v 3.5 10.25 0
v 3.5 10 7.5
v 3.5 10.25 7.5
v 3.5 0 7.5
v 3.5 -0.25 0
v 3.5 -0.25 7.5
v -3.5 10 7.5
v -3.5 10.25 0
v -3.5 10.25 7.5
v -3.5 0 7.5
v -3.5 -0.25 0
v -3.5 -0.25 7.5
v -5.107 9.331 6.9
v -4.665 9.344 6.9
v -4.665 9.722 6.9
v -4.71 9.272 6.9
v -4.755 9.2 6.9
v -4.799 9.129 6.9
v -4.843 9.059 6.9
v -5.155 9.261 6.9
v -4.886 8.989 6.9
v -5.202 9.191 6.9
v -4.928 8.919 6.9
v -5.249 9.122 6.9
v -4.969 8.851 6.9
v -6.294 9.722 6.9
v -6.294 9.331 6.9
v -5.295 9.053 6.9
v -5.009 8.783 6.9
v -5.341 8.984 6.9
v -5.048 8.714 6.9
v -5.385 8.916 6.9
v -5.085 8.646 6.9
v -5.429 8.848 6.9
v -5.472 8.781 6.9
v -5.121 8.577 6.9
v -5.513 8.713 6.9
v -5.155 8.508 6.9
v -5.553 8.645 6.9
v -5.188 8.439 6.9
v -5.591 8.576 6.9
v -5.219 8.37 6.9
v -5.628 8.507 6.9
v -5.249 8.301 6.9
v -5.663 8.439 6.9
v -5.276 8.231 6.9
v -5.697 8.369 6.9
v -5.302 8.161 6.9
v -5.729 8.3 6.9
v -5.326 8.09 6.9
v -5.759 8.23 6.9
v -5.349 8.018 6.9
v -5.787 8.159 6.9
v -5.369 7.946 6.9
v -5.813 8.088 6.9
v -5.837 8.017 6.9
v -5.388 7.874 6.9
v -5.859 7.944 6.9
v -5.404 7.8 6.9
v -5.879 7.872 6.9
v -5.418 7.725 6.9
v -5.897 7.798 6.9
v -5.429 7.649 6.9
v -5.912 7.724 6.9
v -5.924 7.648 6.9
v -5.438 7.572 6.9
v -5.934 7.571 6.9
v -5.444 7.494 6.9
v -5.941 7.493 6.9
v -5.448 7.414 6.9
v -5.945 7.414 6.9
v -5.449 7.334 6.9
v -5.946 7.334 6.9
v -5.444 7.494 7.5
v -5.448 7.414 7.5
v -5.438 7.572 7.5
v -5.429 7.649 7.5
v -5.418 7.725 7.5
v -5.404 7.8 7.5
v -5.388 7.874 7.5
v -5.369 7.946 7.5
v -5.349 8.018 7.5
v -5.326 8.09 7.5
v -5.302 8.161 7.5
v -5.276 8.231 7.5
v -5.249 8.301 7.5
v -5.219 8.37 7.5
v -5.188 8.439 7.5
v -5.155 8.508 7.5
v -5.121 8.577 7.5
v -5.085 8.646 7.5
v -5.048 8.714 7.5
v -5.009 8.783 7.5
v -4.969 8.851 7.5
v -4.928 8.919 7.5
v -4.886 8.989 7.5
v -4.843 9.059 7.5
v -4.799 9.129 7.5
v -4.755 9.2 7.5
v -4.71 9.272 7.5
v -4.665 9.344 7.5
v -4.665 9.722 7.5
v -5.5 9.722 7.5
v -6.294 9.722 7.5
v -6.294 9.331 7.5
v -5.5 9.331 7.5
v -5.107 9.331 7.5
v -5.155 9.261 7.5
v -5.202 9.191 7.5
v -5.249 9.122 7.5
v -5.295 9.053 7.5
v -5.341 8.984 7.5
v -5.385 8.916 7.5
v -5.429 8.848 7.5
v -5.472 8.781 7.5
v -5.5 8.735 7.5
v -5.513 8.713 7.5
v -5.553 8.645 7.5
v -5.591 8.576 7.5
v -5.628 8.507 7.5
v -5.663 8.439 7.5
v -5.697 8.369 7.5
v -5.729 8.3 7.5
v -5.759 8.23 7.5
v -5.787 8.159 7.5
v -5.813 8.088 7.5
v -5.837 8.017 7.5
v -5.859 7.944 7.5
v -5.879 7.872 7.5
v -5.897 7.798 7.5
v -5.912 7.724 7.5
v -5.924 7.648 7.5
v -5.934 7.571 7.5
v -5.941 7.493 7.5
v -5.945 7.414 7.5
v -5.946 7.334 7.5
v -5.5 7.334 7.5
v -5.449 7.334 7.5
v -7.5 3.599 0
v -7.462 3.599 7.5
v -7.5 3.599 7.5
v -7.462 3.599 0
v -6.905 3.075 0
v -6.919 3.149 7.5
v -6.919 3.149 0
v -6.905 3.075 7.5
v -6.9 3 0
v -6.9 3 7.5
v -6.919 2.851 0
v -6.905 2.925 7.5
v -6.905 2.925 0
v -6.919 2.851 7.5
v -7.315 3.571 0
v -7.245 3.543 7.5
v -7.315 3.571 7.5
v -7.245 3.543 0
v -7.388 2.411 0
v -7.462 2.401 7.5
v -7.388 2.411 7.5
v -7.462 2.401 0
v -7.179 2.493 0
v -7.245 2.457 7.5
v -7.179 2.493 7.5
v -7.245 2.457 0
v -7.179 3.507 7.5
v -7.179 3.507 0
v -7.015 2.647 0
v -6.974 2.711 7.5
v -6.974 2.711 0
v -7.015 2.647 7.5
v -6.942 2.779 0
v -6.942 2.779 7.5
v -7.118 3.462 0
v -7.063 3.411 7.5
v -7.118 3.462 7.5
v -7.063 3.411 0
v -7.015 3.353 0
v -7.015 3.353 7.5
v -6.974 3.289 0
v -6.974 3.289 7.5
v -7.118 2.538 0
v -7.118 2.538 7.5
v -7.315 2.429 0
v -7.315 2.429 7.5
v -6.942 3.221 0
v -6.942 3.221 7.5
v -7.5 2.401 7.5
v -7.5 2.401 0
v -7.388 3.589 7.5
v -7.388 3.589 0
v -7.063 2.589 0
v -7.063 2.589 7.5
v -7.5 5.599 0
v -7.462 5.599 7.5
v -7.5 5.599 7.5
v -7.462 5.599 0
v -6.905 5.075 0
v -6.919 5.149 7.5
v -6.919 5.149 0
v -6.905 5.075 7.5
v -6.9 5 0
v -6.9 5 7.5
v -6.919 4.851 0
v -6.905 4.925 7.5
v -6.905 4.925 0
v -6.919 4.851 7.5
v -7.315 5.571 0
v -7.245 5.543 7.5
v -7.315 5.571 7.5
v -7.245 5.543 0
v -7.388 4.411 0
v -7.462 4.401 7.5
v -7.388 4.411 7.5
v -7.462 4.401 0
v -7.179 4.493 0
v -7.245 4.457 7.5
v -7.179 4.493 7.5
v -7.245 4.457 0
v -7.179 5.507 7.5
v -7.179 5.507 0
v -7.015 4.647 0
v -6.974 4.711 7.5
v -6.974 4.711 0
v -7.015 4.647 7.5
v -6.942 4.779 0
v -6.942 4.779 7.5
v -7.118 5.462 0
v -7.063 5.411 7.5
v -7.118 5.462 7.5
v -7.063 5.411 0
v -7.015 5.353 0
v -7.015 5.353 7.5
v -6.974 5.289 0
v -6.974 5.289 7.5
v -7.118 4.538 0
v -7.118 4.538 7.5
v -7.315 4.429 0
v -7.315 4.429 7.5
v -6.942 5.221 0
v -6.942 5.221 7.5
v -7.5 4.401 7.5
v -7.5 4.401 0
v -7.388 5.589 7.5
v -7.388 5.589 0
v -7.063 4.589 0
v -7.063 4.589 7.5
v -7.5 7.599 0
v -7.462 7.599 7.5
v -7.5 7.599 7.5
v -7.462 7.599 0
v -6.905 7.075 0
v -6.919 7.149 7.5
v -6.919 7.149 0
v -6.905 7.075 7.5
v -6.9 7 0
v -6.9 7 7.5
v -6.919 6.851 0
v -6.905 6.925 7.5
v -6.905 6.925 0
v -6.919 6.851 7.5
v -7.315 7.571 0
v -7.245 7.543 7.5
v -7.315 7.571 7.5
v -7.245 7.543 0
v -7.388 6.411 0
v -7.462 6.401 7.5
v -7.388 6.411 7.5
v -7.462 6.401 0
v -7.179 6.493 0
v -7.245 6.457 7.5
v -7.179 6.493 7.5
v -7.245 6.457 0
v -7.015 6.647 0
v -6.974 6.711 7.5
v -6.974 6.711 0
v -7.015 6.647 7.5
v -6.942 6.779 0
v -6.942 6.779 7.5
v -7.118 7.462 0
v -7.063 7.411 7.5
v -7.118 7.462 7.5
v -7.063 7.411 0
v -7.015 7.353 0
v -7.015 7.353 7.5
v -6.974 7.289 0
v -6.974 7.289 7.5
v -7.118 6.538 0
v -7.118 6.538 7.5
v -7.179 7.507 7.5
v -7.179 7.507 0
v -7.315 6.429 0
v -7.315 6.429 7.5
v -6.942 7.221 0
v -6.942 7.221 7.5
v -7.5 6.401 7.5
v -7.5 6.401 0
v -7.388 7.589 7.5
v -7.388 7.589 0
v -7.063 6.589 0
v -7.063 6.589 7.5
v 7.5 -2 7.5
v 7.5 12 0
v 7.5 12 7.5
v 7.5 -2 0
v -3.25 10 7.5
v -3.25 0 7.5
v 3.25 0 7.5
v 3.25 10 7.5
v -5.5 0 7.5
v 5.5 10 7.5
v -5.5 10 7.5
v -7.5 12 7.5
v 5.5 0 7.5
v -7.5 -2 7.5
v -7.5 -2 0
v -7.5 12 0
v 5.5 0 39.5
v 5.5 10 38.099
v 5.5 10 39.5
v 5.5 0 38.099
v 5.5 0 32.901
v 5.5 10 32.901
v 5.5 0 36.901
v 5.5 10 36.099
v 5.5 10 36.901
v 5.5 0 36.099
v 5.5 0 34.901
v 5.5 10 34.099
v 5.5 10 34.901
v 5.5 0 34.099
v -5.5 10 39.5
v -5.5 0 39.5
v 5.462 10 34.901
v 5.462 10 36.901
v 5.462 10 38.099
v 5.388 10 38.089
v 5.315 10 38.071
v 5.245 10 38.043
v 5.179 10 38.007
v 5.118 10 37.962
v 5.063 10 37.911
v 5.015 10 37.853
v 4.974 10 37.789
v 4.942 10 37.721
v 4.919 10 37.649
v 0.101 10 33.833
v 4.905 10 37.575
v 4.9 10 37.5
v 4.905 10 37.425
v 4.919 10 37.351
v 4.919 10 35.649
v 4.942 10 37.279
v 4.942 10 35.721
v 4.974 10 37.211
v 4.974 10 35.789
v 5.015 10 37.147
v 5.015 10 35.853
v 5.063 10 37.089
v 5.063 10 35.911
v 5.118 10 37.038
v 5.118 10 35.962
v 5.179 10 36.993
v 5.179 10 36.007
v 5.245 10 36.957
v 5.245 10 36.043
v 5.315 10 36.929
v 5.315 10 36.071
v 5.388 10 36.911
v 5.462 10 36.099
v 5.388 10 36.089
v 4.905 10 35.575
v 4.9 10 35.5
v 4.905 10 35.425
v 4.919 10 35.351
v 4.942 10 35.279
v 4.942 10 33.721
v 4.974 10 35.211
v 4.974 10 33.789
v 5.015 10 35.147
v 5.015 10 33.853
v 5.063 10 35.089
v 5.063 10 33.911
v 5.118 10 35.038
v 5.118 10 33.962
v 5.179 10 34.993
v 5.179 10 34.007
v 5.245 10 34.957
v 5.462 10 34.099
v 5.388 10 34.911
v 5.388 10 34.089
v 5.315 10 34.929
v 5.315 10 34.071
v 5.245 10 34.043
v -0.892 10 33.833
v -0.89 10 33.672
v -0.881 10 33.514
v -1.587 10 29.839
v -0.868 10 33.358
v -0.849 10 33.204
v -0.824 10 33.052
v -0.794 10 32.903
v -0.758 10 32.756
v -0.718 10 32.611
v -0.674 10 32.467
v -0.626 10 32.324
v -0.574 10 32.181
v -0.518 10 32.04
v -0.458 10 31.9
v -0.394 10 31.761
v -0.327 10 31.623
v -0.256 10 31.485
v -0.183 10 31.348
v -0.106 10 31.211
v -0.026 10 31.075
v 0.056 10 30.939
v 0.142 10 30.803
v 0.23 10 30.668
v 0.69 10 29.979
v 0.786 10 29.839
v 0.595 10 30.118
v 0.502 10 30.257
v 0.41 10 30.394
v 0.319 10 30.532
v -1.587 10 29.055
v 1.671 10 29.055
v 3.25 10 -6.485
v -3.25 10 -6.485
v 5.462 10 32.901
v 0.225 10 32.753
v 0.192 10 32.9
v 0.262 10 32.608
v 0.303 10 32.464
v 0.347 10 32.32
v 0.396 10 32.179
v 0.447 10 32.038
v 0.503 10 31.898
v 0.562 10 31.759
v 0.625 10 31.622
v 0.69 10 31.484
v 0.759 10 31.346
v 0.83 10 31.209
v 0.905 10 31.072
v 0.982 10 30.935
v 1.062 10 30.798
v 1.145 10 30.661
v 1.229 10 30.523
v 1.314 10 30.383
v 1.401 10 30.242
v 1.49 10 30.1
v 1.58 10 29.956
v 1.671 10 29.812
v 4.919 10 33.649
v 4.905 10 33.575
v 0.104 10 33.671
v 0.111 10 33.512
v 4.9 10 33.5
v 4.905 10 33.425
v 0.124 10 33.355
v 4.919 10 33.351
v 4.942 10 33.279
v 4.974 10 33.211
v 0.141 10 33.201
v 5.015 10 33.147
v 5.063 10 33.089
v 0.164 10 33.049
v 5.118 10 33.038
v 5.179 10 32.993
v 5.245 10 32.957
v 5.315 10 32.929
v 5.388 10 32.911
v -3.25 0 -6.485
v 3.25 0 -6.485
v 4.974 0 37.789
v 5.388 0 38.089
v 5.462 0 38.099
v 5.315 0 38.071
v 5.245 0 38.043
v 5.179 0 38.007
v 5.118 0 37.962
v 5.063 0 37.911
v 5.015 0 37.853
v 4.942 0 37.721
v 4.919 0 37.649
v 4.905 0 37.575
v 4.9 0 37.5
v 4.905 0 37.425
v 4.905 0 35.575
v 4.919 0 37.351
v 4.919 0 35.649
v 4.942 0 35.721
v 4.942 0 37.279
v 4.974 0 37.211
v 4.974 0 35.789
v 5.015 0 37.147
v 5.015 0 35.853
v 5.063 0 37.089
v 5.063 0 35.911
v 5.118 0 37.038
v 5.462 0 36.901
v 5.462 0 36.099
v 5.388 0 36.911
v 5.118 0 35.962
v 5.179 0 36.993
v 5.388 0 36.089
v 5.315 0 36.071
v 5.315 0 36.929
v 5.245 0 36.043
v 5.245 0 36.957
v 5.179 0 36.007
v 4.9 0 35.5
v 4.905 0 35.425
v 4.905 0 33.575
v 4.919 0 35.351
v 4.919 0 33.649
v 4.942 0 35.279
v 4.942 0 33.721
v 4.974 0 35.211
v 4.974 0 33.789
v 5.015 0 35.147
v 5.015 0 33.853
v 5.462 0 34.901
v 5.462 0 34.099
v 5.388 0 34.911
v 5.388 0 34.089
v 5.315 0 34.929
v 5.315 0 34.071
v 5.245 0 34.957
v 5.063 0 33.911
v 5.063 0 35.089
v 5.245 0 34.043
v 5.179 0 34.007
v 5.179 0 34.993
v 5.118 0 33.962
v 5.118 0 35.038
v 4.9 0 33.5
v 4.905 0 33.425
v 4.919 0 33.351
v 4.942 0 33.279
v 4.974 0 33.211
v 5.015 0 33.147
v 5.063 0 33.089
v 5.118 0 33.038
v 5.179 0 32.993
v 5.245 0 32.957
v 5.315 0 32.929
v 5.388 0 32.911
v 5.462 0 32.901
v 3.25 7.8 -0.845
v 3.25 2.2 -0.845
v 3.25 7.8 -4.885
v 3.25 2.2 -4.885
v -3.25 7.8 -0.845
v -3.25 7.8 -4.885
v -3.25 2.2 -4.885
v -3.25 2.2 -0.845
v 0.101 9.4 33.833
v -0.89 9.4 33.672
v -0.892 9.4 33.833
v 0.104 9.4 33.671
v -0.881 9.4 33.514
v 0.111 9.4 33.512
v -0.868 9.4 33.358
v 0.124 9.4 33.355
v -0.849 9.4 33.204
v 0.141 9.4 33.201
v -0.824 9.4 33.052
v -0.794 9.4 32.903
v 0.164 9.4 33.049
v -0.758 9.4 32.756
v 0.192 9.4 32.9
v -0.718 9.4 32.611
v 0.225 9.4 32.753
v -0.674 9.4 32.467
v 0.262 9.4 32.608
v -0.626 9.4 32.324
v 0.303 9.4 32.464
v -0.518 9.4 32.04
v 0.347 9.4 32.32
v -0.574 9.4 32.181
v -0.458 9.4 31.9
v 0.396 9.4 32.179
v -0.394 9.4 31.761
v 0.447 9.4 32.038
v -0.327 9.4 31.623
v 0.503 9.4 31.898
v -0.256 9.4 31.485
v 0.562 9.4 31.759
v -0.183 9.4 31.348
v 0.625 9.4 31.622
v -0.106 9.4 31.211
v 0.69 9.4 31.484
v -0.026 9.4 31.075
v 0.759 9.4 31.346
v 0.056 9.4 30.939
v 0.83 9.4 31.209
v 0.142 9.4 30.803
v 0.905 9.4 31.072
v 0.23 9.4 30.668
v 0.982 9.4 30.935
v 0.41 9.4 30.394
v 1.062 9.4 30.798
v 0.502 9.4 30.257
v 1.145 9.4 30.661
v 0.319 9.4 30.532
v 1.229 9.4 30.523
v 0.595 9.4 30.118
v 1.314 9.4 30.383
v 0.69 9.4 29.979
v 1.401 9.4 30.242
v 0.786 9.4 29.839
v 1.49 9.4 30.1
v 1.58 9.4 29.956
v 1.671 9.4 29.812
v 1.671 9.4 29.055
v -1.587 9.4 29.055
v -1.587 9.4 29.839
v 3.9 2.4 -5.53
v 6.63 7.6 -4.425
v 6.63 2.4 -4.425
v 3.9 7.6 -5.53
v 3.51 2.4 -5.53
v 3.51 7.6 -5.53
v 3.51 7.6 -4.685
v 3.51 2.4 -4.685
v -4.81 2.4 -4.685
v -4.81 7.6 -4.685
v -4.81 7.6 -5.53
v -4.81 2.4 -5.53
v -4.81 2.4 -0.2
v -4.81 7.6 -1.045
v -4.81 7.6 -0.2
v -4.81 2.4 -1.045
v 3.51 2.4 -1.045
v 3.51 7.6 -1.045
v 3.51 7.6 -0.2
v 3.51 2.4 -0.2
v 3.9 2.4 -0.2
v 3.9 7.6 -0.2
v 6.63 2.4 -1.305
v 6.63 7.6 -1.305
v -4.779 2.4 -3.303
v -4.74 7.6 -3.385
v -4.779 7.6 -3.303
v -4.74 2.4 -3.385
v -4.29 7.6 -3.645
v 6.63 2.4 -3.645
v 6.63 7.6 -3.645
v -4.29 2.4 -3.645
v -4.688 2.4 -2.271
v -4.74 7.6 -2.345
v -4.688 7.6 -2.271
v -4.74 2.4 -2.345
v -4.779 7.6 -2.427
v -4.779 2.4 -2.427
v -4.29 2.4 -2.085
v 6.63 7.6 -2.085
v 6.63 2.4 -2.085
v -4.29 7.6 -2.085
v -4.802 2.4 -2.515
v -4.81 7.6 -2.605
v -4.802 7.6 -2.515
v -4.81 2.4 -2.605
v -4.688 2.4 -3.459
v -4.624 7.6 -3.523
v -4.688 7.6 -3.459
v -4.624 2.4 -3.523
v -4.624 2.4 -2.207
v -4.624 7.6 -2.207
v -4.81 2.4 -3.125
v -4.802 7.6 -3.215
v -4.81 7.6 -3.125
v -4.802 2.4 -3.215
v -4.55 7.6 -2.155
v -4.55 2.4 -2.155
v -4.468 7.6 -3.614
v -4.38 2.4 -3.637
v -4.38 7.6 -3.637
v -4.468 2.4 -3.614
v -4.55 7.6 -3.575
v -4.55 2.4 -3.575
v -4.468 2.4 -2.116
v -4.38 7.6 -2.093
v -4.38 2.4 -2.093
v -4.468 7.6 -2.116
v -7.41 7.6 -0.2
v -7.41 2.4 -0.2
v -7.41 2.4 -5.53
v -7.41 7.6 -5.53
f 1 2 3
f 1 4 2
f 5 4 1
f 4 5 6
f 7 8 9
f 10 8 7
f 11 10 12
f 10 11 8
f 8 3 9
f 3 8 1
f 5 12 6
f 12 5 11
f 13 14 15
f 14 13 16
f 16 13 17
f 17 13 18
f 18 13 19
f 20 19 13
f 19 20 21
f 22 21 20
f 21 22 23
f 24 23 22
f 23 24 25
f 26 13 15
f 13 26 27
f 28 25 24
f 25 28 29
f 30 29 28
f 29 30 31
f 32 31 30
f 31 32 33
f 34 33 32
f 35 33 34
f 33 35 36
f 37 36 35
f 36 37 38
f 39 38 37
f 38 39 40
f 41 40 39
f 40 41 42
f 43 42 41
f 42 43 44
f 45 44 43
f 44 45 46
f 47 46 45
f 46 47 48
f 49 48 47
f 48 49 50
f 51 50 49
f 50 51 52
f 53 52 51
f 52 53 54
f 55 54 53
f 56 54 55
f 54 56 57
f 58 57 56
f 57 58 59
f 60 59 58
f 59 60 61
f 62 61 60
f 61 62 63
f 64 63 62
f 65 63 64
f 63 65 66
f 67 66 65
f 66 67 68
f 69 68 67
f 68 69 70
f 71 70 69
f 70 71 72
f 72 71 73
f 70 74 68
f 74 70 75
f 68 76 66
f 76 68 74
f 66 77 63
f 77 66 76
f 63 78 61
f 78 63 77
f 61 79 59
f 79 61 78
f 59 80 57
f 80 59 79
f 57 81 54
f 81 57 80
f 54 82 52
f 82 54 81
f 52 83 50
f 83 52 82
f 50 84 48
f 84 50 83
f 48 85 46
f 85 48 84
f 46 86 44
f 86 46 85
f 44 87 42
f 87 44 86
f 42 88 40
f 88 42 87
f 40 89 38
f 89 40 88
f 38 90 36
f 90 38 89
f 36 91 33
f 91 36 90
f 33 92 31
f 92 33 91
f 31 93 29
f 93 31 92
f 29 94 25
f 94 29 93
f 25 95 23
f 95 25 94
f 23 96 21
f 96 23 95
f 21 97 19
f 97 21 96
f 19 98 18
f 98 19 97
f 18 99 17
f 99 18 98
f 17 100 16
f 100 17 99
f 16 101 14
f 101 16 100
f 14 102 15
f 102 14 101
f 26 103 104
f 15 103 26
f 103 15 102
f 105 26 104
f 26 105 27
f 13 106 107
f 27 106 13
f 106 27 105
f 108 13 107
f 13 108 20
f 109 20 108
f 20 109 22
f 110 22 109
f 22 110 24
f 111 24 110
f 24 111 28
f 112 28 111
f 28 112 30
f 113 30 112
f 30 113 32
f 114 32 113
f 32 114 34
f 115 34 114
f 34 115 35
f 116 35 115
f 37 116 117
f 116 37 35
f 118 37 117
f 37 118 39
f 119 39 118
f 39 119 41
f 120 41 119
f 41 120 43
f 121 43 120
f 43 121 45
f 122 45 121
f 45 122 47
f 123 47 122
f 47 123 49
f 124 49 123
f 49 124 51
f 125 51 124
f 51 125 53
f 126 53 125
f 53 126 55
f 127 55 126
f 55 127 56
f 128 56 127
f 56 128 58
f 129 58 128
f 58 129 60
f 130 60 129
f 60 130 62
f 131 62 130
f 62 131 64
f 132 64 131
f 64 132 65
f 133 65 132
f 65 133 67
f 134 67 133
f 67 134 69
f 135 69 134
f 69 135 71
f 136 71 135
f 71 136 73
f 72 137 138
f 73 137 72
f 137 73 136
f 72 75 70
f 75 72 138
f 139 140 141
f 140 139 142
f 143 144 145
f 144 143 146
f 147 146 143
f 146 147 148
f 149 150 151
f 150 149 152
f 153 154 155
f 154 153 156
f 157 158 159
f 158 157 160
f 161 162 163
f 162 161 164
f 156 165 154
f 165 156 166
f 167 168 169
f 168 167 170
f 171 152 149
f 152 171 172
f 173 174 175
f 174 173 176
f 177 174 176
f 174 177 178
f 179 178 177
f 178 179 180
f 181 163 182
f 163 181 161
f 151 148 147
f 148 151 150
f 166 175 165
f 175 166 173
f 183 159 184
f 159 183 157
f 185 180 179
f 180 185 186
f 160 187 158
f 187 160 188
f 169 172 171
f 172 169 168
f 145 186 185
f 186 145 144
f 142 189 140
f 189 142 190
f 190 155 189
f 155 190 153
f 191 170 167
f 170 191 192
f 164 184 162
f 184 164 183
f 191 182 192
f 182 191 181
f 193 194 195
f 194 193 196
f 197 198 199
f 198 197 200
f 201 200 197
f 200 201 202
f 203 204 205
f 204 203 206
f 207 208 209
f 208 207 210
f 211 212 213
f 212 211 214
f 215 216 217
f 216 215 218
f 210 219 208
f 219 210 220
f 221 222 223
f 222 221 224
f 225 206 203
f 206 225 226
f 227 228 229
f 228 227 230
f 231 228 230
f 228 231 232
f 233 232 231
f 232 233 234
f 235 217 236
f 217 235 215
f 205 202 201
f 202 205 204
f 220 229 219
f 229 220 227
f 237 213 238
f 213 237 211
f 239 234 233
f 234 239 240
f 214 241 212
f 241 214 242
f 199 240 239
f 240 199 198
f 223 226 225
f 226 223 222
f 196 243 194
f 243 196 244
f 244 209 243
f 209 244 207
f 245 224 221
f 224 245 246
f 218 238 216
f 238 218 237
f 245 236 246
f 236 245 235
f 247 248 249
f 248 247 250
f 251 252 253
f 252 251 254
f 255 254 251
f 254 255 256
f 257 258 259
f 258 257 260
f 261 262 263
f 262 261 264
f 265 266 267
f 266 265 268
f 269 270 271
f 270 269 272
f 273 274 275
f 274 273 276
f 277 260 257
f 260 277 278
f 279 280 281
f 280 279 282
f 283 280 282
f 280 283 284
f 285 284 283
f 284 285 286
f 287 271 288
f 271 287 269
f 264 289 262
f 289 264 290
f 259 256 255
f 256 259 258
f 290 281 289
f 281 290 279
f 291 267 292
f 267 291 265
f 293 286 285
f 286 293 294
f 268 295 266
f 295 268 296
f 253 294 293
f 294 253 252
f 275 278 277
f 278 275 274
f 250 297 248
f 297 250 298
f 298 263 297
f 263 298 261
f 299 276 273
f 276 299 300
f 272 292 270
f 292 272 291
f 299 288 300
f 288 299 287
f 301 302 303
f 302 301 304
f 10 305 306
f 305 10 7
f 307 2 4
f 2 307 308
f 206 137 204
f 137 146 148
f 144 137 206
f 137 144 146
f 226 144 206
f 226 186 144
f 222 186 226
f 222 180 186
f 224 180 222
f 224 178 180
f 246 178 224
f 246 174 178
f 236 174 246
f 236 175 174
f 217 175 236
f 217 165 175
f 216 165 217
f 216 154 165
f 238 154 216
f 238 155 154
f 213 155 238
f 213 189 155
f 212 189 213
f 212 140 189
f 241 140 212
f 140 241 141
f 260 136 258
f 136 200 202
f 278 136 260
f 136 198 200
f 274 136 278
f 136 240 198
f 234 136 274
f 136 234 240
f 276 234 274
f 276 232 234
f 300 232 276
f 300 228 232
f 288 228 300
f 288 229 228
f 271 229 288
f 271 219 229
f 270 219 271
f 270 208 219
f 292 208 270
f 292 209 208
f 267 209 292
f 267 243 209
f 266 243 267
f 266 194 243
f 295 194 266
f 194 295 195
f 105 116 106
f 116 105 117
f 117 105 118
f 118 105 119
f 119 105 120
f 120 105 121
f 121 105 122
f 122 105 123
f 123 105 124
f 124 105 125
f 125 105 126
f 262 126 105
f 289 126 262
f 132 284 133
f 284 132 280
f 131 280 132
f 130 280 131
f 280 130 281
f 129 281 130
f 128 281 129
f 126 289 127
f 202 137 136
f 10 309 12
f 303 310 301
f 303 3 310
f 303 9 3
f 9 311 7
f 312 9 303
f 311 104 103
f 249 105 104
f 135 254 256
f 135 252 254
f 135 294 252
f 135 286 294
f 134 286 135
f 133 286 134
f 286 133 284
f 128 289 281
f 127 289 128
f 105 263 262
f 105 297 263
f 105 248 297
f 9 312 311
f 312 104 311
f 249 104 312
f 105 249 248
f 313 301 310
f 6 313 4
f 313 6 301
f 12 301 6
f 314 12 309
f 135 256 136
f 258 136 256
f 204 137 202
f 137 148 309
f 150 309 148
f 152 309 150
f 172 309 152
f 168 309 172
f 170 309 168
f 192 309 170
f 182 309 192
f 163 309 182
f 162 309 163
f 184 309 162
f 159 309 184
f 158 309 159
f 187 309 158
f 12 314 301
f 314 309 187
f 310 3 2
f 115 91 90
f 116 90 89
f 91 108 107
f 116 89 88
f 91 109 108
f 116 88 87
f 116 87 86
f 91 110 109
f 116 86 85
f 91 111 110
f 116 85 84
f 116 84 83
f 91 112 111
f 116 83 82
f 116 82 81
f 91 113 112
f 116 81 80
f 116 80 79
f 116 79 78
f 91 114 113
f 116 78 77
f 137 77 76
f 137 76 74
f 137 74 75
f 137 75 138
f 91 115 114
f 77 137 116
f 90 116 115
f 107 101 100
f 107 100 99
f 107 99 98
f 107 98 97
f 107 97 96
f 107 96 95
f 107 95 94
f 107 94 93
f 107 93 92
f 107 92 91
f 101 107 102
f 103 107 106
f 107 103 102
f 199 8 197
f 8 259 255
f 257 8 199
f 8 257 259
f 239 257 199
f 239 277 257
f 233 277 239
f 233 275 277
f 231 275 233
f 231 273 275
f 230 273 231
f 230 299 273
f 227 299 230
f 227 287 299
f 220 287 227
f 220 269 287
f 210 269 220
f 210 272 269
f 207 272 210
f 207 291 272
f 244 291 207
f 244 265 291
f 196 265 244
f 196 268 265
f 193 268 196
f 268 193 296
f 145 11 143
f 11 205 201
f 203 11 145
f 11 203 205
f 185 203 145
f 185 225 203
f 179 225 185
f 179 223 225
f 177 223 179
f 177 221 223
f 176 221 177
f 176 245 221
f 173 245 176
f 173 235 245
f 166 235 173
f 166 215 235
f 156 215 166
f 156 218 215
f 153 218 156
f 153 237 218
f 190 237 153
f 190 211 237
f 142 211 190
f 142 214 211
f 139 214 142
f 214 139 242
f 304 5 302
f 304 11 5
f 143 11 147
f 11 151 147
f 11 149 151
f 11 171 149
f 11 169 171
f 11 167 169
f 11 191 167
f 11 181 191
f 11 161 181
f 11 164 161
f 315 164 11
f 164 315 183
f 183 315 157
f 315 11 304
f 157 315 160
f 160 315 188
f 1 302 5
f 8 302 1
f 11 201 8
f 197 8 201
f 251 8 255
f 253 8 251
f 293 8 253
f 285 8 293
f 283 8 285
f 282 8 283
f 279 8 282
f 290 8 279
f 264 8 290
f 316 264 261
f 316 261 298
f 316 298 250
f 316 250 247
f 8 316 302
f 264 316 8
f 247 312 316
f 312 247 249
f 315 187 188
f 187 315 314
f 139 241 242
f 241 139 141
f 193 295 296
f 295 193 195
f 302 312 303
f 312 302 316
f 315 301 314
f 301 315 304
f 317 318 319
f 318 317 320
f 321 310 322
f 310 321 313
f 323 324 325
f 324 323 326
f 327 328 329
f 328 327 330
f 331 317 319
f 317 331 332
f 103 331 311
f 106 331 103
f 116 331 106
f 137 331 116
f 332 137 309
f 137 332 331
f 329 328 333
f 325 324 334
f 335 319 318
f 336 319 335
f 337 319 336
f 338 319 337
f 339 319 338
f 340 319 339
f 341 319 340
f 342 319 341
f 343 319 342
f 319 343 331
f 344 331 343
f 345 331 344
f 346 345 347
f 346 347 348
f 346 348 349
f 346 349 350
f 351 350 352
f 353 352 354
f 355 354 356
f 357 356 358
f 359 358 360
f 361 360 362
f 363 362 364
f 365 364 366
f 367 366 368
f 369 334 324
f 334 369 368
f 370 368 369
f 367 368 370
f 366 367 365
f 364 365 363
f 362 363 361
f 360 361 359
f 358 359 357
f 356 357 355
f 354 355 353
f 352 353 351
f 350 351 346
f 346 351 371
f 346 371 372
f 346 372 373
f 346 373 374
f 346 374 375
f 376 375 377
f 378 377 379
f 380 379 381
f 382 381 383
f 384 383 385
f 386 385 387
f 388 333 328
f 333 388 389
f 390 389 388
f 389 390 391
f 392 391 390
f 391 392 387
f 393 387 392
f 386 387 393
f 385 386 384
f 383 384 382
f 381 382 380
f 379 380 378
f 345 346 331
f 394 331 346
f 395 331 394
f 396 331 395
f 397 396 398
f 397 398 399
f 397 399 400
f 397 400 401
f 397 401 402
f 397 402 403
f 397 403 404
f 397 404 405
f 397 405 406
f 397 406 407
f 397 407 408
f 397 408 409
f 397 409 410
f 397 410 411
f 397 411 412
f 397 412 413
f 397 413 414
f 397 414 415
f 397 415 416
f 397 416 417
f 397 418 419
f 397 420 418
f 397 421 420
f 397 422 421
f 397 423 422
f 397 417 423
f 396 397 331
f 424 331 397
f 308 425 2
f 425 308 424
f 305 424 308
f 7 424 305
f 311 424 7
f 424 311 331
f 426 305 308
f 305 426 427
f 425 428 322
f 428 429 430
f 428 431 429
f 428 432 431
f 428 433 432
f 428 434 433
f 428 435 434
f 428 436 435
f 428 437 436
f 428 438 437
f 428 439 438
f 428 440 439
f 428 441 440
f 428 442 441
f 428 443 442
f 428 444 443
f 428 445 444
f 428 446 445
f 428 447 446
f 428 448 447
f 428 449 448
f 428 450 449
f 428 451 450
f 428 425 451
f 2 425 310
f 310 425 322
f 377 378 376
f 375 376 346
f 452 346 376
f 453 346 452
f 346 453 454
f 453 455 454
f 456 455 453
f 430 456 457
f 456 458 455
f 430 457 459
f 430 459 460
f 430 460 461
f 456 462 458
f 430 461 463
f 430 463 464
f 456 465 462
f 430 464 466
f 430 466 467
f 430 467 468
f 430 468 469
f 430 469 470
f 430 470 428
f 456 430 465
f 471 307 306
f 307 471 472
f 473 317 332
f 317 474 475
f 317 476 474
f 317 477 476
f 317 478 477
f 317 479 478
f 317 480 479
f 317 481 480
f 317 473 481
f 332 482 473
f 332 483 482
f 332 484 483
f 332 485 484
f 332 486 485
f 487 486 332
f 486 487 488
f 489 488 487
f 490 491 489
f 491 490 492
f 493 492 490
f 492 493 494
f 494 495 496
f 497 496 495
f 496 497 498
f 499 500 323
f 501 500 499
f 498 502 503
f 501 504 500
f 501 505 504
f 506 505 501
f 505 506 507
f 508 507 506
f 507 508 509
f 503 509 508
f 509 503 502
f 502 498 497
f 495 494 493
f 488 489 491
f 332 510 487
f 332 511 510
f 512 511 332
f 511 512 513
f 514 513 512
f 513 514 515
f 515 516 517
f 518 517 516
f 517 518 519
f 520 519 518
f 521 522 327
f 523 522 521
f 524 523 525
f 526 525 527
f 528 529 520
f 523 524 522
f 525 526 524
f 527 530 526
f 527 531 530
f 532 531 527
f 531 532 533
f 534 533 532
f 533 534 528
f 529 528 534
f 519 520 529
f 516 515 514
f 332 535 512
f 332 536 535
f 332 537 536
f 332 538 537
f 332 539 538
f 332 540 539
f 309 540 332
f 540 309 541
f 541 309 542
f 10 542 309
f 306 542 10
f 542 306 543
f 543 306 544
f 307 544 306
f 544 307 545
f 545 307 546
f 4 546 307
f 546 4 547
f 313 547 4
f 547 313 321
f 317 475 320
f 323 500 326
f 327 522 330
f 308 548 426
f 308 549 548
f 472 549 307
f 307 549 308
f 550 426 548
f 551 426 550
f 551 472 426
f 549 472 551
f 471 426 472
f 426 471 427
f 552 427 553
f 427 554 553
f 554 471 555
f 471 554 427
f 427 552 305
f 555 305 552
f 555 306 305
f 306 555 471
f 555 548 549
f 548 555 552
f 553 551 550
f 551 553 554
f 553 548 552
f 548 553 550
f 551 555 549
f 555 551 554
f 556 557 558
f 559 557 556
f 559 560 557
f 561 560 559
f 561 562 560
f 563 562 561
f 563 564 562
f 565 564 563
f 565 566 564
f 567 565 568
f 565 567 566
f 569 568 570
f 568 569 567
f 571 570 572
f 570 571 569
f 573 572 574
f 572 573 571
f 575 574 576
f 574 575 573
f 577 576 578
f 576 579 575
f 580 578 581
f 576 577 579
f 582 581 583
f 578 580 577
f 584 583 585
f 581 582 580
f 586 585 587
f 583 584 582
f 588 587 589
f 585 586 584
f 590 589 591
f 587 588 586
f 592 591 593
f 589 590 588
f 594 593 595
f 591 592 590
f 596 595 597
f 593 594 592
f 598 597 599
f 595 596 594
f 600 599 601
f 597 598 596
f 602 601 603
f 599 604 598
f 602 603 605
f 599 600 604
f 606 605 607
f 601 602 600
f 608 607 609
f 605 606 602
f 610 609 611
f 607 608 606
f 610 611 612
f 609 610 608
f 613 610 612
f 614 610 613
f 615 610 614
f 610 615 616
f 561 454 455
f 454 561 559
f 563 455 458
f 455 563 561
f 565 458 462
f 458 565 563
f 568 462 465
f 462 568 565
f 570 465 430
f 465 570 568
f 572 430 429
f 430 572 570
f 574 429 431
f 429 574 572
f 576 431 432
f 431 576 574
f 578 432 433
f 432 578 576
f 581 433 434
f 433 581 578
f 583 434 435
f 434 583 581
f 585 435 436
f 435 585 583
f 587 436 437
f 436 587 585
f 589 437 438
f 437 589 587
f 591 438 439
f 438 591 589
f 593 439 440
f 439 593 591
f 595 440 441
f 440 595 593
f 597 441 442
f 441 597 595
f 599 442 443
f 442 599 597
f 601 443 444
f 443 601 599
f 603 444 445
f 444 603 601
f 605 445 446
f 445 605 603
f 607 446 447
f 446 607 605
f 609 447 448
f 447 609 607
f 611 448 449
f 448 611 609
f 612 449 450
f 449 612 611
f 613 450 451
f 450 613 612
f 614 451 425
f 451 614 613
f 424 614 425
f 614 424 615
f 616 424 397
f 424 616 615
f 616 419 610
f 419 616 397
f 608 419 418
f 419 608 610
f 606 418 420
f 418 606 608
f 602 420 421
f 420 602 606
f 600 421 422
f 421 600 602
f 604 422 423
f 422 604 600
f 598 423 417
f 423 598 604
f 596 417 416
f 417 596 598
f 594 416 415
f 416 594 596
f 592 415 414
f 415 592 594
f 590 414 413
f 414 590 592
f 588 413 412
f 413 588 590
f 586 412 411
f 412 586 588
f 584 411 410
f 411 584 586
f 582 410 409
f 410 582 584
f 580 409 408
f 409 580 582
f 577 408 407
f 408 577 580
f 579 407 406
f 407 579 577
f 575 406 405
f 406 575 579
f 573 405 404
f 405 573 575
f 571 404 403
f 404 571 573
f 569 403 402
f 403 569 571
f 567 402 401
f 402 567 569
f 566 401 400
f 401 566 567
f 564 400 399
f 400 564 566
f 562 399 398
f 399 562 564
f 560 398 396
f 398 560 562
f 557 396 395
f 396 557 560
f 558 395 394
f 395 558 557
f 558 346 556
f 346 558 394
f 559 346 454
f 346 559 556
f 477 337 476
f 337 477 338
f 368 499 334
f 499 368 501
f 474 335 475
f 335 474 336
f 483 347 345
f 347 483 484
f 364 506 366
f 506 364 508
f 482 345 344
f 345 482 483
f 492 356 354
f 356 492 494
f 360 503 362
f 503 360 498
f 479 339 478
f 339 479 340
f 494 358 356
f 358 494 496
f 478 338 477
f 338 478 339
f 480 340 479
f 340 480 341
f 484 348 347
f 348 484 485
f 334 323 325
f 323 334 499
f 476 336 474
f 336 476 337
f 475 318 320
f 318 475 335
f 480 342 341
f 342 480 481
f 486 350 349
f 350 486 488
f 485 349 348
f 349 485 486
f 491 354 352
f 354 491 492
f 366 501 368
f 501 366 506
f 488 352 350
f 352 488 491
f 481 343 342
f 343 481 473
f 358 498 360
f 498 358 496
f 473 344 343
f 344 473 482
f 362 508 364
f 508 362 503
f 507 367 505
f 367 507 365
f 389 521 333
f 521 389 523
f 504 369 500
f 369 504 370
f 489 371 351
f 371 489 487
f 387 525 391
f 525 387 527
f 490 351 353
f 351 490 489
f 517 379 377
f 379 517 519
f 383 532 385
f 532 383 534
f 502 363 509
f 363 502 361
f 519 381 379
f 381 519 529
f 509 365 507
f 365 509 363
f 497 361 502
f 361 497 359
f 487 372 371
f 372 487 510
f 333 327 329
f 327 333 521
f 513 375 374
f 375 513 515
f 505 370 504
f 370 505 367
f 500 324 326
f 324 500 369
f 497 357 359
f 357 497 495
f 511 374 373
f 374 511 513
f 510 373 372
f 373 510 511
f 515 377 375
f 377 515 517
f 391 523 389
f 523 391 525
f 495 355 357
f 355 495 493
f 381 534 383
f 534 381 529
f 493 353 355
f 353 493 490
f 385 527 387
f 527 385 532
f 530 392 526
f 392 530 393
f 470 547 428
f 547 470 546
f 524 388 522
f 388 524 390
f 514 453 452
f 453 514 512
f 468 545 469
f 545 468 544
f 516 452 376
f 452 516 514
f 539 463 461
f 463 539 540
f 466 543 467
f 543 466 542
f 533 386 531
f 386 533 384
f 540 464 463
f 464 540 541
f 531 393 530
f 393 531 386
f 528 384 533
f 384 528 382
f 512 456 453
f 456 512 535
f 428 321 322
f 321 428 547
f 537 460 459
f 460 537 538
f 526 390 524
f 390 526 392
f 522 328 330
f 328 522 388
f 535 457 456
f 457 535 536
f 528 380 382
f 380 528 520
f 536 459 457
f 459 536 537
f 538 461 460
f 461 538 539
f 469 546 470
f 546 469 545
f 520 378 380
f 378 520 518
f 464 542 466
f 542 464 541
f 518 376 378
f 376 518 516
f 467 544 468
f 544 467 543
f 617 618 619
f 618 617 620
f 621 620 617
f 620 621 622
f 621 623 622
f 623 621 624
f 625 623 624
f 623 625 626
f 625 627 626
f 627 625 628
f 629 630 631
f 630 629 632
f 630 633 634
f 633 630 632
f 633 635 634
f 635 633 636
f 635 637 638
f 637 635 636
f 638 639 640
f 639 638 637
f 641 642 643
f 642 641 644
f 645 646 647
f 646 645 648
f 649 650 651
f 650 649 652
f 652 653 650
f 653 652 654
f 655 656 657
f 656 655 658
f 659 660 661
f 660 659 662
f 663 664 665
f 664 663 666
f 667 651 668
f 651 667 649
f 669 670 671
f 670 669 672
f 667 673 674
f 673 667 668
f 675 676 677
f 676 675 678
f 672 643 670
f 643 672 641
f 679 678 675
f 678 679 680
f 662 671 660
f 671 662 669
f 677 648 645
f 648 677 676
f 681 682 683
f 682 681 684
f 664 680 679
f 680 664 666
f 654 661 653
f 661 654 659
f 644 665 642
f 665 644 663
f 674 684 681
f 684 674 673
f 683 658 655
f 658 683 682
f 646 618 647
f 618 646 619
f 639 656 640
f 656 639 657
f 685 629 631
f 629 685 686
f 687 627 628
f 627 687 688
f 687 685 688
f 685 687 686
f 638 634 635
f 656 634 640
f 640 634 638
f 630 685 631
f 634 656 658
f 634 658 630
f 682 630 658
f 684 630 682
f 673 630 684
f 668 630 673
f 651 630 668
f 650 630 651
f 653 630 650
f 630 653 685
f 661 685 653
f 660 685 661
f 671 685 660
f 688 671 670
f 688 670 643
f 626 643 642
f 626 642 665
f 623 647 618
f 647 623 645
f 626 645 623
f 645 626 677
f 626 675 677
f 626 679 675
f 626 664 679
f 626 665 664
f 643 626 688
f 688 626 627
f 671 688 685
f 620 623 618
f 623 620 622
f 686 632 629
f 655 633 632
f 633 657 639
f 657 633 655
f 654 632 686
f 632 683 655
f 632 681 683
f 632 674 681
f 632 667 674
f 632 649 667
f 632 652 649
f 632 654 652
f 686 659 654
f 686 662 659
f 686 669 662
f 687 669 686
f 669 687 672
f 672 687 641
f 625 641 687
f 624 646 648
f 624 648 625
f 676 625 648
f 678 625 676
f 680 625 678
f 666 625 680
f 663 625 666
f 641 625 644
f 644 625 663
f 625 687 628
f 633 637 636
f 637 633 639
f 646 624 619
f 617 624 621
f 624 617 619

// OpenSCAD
$fn = 50;

difference() {
	union() {
		translate(v = [0, 0, 0]) {
			rotate(a = [0, 0, 0]) {
				difference() {
					union() {
						translate(v = [-7.5, -2.0, 0]) {
							cube(size = [15.0, 14.0, 7.5]);
						}
					}
					union() {
						translate(v = [-3.5, -0.25, -0.1]) {
							cube(size = [7.0, 10.5, 7.7]);
						}
						translate(v = [-5.5, 8.5, 6.9]) {
							linear_extrude(height = 0.7) {
								text(font = "Arial:style=Bold", halign = "center", size = 2.5, text = "7", valign = "center");
							}
						}
						translate(v = [-7.5, 3, -0.1]) {
							cylinder(h = 7.7, r = 0.6);
						}
						translate(v = [-7.5, 5, -0.1]) {
							cylinder(h = 7.7, r = 0.6);
						}
						translate(v = [-7.5, 7, -0.1]) {
							cylinder(h = 7.7, r = 0.6);
						}
					}
				}
			}
		}
		translate(v = [0, 0, 7.5]) {
			rotate(a = [0, 0, 0]) {
				difference() {
					union() {
						translate(v = [-5.5, 0, 0]) {
							cube(size = [11.0, 10.0, 32.0]);
						}
						translate(v = [-3.25, 0, -13.985]) {
							cube(size = [6.5, 10.0, 14.084999999999999]);
						}
					}
					union() {
						translate(v = [-3.35, 2.1999999999999997, -12.385]) {
							cube(size = [6.7, 5.6000000000000005, 4.04]);
						}
						translate(v = [0, 9.4, 24.0]) {
							rotate(a = [-90, 0, 0]) {
								linear_extrude(height = 0.7) {
									text(font = "Arial:style=Bold", halign = "center", size = 5.0, text = "7", valign = "center");
								}
							}
						}
						translate(v = [5.5, 10.1, 30.0]) {
							rotate(a = [90, 0, 0]) {
								cylinder(h = 10.2, r = 0.6);
							}
						}
						translate(v = [5.5, 10.1, 28.0]) {
							rotate(a = [90, 0, 0]) {
								cylinder(h = 10.2, r = 0.6);
							}
						}
						translate(v = [5.5, 10.1, 26.0]) {
							rotate(a = [90, 0, 0]) {
								cylinder(h = 10.2, r = 0.6);
							}
						}
					}
				}
			}
		}
		translate(v = [0, 2.4, -2.865]) {
			rotate(a = [0, 0, 0]) {
				difference() {
					union() {
						translate(v = [-7.41, 0, -2.665]) {
							cube(size = [14.04, 5.2, 5.33]);
						}
					}
					union() {
						translate(v = [0, 5.3, 0]) {
							rotate(a = [90, 0, 0]) {
								linear_extrude(height = 5.4) {
									polygon(points = [[-4.81, -1.82], [3.51, -1.82], [3.51, -2.665], [3.9, -2.665], [6.63, -1.56], [6.73, -1.56], [6.73, -2.765], [-4.81, -2.765]]);
								}
							}
						}
						translate(v = [0, 5.3, 0]) {
							rotate(a = [90, 0, 0]) {
								linear_extrude(height = 5.4) {
									polygon(points = [[-4.81, 1.82], [3.51, 1.82], [3.51, 2.665], [3.9, 2.665], [6.63, 1.56], [6.73, 1.56], [6.73, 2.765], [-4.81, 2.765]]);
								}
							}
						}
						translate(v = [0, 5.3, 0]) {
							rotate(a = [90, 0, 0]) {
								linear_extrude(height = 5.4) {
									polygon(points = [[-4.81, 0.26], [-4.8021, 0.350297], [-4.77864, 0.43785], [-4.740333, 0.52], [-4.688343, 0.59425], [-4.62425, 0.658343], [-4.55, 0.710333], [-4.46785, 0.74864], [-4.380297, 0.7721], [-4.29, 0.78], [6.73, 0.78], [6.73, -0.78], [-4.29, -0.78], [-4.380297, -0.7721], [-4.46785, -0.74864], [-4.55, -0.710333], [-4.62425, -0.658343], [-4.688343, -0.59425], [-4.740333, -0.52], [-4.77864, -0.43785], [-4.8021, -0.350297], [-4.81, -0.26]]);
								}
							}
						}
					}
				}
			}
		}
	}
	union();
}
